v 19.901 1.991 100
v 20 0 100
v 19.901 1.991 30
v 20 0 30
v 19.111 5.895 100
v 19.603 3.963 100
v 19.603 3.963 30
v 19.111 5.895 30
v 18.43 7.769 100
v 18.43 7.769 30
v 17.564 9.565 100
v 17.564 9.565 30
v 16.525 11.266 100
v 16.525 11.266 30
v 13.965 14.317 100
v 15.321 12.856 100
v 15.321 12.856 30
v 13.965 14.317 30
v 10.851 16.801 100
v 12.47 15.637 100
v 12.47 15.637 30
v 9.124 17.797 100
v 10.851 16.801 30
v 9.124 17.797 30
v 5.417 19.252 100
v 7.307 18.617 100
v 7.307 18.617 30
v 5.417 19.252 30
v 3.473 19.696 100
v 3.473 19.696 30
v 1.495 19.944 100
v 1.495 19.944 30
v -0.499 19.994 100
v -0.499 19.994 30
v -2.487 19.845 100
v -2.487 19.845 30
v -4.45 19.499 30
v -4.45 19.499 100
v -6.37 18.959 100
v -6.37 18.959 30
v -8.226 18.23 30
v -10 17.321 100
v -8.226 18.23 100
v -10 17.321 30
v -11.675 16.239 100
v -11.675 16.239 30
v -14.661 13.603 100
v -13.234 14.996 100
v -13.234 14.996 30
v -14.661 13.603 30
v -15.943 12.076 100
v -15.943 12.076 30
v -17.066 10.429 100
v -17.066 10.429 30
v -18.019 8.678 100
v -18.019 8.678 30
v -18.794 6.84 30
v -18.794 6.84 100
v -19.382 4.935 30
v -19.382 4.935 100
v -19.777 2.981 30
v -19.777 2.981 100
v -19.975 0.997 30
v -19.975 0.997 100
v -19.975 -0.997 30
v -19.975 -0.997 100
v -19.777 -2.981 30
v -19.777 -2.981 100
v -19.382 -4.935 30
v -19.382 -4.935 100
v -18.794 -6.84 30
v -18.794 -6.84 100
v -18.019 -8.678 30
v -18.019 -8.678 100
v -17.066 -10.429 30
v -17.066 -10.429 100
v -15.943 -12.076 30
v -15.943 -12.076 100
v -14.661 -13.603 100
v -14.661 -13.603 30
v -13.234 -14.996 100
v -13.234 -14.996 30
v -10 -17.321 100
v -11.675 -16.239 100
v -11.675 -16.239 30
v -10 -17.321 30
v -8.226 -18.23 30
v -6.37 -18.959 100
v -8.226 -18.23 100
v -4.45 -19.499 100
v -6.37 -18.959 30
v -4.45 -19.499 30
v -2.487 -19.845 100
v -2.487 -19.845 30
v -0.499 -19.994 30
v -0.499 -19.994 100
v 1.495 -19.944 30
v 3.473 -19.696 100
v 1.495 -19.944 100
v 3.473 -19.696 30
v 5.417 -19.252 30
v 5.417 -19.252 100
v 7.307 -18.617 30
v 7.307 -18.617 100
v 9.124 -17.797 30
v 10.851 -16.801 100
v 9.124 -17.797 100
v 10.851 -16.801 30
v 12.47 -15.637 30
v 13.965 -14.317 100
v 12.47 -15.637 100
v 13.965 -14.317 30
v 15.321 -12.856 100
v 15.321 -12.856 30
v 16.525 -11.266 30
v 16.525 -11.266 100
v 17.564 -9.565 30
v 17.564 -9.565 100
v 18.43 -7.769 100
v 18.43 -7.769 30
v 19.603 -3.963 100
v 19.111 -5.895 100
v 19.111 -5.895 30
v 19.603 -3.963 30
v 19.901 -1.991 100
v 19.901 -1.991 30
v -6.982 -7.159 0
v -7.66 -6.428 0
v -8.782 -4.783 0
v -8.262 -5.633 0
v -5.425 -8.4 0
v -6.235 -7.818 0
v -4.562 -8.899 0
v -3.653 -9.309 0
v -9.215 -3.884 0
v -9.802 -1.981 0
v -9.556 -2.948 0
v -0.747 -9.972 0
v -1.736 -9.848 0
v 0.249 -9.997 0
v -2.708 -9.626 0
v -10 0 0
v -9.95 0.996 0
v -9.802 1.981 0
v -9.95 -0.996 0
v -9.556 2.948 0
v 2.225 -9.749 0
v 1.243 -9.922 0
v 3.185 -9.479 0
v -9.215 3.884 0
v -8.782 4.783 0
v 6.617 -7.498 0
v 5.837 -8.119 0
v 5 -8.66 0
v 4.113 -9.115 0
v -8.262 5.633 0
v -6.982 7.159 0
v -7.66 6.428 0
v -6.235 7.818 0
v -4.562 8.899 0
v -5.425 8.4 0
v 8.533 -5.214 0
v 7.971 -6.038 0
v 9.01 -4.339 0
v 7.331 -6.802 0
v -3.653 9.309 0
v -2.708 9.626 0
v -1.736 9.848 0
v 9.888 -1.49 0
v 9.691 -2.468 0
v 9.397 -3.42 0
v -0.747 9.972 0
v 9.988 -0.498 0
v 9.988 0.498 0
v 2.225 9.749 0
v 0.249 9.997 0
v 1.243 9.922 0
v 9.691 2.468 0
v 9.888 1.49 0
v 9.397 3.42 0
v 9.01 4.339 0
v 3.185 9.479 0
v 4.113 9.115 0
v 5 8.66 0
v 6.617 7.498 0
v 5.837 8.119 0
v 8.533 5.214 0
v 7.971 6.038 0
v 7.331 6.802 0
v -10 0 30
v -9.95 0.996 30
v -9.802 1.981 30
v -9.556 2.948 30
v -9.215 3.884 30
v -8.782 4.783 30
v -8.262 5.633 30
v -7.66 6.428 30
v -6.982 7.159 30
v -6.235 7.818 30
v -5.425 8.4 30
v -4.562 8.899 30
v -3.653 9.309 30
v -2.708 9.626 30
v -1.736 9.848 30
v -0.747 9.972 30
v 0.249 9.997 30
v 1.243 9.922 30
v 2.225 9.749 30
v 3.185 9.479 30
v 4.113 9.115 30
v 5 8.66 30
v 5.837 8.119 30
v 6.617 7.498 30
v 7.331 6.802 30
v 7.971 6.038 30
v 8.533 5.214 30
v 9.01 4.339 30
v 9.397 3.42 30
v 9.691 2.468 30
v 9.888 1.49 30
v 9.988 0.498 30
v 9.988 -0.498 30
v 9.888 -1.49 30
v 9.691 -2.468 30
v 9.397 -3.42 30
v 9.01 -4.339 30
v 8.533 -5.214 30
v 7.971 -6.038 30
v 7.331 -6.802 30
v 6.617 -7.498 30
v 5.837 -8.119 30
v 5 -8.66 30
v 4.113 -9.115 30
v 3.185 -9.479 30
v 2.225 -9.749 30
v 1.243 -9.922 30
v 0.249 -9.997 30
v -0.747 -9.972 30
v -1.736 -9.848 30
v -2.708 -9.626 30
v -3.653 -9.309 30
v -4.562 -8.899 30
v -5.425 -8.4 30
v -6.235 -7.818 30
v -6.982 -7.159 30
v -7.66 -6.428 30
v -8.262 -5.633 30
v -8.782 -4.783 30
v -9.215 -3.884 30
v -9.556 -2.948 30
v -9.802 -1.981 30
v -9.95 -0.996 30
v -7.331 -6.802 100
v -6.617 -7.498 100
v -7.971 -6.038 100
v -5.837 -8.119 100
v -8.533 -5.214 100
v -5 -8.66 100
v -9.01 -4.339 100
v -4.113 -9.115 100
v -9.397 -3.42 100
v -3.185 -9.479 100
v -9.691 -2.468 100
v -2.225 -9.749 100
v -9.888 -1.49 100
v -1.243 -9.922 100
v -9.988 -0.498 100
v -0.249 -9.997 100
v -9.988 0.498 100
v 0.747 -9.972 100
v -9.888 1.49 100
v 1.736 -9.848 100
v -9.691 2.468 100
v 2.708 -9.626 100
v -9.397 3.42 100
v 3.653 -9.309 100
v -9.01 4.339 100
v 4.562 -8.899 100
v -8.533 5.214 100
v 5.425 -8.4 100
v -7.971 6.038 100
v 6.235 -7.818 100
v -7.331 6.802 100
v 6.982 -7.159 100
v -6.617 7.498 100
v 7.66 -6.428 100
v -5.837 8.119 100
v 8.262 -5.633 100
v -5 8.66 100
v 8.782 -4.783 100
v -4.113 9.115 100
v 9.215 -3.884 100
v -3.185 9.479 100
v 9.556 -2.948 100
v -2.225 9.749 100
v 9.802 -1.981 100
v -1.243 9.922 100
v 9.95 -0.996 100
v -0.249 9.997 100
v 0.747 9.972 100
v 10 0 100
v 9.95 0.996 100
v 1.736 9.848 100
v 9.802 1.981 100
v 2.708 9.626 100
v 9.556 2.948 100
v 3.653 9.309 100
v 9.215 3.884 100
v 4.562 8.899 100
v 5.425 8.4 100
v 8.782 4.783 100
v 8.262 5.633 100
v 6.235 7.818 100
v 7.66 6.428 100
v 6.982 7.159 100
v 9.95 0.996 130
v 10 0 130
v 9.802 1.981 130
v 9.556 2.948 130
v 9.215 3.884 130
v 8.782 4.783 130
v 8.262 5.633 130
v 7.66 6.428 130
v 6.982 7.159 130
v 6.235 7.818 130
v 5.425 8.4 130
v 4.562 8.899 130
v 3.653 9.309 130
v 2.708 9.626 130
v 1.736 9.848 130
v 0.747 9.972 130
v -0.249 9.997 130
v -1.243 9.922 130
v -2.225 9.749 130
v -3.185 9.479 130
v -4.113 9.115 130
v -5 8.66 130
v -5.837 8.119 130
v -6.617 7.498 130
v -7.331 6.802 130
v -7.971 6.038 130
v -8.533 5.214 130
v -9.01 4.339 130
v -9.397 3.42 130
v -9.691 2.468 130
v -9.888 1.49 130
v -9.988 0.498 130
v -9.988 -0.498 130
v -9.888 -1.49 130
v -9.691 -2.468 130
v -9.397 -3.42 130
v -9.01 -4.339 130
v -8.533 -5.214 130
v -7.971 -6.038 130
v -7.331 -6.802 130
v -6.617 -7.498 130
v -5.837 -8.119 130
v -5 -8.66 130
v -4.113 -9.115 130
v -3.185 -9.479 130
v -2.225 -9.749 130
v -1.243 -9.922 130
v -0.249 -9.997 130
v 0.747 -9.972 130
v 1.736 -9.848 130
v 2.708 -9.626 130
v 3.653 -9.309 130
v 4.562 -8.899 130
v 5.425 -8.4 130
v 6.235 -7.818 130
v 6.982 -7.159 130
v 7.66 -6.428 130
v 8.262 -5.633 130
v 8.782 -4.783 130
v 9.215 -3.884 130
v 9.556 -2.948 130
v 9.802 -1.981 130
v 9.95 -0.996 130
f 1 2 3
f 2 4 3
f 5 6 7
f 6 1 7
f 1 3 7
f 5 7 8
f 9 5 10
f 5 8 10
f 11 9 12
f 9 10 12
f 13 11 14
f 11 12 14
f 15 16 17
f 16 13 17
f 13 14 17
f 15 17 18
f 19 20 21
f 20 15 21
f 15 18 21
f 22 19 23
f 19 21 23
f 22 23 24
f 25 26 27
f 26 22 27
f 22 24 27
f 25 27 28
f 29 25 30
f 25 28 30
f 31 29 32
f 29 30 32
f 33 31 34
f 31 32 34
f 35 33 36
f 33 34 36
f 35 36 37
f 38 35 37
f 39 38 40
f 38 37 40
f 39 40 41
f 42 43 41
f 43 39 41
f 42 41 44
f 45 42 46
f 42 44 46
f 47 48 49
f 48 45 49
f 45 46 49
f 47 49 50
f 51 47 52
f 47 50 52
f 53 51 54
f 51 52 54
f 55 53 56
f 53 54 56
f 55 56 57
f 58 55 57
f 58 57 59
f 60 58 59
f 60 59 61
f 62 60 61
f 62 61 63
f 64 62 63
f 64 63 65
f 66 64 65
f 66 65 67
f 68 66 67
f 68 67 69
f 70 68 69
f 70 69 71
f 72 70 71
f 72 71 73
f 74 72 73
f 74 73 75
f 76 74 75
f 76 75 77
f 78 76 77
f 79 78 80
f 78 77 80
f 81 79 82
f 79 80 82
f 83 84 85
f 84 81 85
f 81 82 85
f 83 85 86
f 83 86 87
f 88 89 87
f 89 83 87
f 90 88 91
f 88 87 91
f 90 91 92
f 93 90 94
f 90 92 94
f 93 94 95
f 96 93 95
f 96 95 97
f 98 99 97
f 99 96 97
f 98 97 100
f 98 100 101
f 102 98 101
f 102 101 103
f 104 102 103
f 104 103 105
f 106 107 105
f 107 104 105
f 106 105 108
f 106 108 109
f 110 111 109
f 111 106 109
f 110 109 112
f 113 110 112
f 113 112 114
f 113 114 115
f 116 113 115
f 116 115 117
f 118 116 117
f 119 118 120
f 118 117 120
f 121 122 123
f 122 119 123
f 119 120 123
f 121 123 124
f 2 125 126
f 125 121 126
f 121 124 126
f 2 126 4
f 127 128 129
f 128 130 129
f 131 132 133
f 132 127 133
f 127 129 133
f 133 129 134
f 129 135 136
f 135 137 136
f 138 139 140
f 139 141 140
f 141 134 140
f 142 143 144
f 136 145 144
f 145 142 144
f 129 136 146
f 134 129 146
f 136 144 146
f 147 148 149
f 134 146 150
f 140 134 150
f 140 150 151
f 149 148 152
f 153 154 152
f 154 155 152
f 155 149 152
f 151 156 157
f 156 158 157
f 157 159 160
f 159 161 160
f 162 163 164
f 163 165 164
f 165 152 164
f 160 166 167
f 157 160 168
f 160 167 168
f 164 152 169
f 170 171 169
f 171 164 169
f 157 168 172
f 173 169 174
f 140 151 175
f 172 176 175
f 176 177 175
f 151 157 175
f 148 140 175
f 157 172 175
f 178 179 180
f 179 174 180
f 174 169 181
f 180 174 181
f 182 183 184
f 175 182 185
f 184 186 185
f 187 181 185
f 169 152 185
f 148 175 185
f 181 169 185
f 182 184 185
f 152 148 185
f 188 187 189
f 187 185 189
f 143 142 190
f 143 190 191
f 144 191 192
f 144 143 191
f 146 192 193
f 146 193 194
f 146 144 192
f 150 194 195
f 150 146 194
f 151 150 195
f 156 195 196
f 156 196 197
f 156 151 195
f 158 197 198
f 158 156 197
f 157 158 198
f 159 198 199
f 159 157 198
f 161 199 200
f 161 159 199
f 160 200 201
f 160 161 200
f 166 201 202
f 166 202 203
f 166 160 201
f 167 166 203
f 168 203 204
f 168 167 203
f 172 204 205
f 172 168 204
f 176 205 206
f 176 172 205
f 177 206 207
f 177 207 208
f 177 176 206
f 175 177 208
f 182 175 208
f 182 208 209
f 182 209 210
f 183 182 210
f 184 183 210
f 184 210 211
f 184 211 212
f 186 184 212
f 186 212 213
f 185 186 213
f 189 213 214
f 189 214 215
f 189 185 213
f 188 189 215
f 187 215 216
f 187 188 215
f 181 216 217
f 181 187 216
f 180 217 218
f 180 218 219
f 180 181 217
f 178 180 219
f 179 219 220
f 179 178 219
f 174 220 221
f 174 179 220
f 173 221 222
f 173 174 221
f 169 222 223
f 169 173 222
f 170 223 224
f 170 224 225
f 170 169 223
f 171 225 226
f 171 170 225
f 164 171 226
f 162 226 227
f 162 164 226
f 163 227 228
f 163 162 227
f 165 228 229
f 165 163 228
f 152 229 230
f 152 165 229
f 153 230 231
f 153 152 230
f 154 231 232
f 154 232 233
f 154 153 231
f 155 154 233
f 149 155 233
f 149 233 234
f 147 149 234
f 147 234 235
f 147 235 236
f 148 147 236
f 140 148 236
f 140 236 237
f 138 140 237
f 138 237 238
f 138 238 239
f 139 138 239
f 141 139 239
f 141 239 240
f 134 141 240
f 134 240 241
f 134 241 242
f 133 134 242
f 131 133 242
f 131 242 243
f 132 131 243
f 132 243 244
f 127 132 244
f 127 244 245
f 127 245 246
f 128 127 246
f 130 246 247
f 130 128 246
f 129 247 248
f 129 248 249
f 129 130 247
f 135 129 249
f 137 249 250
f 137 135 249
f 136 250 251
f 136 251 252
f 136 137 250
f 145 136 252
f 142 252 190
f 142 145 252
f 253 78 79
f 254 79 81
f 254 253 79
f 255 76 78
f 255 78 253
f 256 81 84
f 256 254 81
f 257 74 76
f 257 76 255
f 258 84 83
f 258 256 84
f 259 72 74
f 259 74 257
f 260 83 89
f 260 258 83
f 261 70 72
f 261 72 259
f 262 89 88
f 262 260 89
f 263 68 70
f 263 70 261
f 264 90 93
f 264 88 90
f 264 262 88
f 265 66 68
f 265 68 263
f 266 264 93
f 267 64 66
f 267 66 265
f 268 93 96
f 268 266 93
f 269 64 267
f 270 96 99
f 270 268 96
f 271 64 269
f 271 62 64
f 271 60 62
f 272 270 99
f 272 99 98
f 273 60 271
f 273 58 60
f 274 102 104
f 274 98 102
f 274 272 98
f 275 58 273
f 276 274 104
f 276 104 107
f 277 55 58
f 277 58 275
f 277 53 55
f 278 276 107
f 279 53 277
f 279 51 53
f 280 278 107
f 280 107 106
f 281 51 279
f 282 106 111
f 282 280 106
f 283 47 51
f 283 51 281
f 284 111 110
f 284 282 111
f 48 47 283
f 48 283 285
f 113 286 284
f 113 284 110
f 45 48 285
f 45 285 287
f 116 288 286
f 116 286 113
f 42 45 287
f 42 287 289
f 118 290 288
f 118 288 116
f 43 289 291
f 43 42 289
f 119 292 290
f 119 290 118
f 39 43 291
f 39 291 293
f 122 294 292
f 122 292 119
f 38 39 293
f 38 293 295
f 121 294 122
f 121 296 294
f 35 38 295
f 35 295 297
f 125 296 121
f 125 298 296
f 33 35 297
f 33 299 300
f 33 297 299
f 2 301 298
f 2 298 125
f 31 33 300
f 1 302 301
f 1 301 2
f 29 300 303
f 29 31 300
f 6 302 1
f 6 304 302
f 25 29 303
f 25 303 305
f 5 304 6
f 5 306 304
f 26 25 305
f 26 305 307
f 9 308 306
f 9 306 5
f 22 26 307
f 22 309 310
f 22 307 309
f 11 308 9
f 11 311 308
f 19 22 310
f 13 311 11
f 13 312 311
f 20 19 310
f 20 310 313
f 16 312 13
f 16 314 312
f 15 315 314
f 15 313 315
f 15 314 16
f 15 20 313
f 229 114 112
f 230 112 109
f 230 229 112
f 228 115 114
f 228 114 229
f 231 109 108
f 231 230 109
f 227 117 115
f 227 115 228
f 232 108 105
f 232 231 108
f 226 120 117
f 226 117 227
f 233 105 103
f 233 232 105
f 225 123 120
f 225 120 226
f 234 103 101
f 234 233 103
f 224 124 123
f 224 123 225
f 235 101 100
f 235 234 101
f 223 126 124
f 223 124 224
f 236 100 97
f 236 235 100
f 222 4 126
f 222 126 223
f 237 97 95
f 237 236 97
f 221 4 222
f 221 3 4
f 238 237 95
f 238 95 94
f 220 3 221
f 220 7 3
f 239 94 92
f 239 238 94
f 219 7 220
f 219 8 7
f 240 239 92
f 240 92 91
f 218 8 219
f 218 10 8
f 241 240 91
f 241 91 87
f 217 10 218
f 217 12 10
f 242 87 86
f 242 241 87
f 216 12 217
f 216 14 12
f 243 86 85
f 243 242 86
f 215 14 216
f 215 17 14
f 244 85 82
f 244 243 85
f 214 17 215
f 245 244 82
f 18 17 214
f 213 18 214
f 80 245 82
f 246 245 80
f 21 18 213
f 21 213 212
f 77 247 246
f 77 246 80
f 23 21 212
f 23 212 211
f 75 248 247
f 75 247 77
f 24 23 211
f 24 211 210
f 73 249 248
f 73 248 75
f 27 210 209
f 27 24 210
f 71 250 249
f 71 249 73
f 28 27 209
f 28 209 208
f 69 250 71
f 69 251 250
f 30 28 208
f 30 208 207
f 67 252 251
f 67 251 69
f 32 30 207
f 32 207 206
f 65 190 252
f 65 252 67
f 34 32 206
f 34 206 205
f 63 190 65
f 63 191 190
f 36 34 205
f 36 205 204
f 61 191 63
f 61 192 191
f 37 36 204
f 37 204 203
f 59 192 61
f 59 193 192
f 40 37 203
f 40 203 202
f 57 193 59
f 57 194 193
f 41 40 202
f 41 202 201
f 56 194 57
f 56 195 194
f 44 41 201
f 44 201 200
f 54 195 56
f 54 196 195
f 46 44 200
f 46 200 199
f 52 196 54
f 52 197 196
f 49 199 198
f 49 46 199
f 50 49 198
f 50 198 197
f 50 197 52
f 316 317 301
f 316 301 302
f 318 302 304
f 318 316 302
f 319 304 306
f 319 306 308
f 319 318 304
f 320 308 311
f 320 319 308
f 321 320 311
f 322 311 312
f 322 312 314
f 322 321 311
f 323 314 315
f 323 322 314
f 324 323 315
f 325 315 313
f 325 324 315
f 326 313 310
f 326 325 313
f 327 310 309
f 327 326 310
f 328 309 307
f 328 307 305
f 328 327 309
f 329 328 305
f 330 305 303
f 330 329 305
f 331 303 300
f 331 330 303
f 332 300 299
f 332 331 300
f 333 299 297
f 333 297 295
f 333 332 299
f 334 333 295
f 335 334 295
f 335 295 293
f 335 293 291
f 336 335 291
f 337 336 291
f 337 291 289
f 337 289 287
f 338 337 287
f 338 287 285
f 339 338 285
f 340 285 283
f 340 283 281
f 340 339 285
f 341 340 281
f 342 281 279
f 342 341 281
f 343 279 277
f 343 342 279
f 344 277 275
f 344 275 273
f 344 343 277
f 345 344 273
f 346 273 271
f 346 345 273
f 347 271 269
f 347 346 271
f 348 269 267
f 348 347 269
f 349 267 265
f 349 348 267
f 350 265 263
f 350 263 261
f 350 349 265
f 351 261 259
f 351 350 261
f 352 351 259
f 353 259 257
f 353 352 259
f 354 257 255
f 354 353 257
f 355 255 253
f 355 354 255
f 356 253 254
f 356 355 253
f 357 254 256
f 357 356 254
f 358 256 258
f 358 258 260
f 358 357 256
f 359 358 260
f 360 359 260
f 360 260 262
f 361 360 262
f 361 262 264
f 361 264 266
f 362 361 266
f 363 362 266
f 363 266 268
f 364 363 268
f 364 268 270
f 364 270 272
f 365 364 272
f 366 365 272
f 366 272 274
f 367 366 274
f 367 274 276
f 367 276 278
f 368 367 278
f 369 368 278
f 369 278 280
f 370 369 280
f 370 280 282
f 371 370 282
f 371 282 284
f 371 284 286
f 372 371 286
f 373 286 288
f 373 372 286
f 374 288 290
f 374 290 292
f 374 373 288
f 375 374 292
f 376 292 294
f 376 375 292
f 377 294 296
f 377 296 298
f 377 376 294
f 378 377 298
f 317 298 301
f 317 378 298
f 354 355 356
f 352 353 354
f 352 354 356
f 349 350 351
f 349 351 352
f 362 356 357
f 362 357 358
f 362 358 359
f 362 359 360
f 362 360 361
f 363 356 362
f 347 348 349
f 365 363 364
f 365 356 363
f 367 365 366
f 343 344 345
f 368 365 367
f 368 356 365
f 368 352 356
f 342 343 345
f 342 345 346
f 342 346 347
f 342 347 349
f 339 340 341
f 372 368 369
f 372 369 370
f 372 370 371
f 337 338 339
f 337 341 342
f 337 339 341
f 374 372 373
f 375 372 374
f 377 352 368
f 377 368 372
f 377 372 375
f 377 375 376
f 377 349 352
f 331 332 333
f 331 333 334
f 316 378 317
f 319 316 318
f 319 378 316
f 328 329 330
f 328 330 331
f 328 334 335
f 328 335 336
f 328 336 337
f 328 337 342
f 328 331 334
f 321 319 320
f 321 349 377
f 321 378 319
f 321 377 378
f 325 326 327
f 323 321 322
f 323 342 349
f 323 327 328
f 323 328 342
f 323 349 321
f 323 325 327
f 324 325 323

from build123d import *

# Parameters (mm, degrees)
SKETCH2_R           = 20
BOSS_EXTRUDE4_DEPTH = 130
SKETCH3_OUTSIDE_W   = 70.354
SKETCH3_OUTSIDE_H   = 70.354
SKETCH3_OUTSIDE_R   = 10
CUT_EXTRUDE1_DEPTH  = 30
SKETCH4_OUTSIDE_W   = 70.354
SKETCH4_OUTSIDE_H   = 70.354
SKETCH4_OUTSIDE_R   = 10
CUT_EXTRUDE2_DEPTH  = 30


with BuildPart() as part:
    # Sketch2 → Boss-Extrude4 (new body)
    with BuildSketch(Plane.XY):
        Circle(SKETCH2_R)
    extrude(amount=BOSS_EXTRUDE4_DEPTH)

    # Sketch3 outside → Cut-Extrude1 (cut)
    with BuildSketch(Plane.XY.offset(130)):
        Rectangle(SKETCH3_OUTSIDE_W, SKETCH3_OUTSIDE_H)
        Circle(SKETCH3_OUTSIDE_R, mode=Mode.SUBTRACT)
    extrude(amount=-CUT_EXTRUDE1_DEPTH, mode=Mode.SUBTRACT)

    # Sketch4 outside → Cut-Extrude2 (cut)
    with BuildSketch(Plane(origin=(0, 0, 0), x_dir=(-1, 0, 0), z_dir=(0, 0, -1))):
        Rectangle(SKETCH4_OUTSIDE_W, SKETCH4_OUTSIDE_H)
        Circle(SKETCH4_OUTSIDE_R, mode=Mode.SUBTRACT)
    extrude(amount=-CUT_EXTRUDE2_DEPTH, mode=Mode.SUBTRACT)


solid = part.part
